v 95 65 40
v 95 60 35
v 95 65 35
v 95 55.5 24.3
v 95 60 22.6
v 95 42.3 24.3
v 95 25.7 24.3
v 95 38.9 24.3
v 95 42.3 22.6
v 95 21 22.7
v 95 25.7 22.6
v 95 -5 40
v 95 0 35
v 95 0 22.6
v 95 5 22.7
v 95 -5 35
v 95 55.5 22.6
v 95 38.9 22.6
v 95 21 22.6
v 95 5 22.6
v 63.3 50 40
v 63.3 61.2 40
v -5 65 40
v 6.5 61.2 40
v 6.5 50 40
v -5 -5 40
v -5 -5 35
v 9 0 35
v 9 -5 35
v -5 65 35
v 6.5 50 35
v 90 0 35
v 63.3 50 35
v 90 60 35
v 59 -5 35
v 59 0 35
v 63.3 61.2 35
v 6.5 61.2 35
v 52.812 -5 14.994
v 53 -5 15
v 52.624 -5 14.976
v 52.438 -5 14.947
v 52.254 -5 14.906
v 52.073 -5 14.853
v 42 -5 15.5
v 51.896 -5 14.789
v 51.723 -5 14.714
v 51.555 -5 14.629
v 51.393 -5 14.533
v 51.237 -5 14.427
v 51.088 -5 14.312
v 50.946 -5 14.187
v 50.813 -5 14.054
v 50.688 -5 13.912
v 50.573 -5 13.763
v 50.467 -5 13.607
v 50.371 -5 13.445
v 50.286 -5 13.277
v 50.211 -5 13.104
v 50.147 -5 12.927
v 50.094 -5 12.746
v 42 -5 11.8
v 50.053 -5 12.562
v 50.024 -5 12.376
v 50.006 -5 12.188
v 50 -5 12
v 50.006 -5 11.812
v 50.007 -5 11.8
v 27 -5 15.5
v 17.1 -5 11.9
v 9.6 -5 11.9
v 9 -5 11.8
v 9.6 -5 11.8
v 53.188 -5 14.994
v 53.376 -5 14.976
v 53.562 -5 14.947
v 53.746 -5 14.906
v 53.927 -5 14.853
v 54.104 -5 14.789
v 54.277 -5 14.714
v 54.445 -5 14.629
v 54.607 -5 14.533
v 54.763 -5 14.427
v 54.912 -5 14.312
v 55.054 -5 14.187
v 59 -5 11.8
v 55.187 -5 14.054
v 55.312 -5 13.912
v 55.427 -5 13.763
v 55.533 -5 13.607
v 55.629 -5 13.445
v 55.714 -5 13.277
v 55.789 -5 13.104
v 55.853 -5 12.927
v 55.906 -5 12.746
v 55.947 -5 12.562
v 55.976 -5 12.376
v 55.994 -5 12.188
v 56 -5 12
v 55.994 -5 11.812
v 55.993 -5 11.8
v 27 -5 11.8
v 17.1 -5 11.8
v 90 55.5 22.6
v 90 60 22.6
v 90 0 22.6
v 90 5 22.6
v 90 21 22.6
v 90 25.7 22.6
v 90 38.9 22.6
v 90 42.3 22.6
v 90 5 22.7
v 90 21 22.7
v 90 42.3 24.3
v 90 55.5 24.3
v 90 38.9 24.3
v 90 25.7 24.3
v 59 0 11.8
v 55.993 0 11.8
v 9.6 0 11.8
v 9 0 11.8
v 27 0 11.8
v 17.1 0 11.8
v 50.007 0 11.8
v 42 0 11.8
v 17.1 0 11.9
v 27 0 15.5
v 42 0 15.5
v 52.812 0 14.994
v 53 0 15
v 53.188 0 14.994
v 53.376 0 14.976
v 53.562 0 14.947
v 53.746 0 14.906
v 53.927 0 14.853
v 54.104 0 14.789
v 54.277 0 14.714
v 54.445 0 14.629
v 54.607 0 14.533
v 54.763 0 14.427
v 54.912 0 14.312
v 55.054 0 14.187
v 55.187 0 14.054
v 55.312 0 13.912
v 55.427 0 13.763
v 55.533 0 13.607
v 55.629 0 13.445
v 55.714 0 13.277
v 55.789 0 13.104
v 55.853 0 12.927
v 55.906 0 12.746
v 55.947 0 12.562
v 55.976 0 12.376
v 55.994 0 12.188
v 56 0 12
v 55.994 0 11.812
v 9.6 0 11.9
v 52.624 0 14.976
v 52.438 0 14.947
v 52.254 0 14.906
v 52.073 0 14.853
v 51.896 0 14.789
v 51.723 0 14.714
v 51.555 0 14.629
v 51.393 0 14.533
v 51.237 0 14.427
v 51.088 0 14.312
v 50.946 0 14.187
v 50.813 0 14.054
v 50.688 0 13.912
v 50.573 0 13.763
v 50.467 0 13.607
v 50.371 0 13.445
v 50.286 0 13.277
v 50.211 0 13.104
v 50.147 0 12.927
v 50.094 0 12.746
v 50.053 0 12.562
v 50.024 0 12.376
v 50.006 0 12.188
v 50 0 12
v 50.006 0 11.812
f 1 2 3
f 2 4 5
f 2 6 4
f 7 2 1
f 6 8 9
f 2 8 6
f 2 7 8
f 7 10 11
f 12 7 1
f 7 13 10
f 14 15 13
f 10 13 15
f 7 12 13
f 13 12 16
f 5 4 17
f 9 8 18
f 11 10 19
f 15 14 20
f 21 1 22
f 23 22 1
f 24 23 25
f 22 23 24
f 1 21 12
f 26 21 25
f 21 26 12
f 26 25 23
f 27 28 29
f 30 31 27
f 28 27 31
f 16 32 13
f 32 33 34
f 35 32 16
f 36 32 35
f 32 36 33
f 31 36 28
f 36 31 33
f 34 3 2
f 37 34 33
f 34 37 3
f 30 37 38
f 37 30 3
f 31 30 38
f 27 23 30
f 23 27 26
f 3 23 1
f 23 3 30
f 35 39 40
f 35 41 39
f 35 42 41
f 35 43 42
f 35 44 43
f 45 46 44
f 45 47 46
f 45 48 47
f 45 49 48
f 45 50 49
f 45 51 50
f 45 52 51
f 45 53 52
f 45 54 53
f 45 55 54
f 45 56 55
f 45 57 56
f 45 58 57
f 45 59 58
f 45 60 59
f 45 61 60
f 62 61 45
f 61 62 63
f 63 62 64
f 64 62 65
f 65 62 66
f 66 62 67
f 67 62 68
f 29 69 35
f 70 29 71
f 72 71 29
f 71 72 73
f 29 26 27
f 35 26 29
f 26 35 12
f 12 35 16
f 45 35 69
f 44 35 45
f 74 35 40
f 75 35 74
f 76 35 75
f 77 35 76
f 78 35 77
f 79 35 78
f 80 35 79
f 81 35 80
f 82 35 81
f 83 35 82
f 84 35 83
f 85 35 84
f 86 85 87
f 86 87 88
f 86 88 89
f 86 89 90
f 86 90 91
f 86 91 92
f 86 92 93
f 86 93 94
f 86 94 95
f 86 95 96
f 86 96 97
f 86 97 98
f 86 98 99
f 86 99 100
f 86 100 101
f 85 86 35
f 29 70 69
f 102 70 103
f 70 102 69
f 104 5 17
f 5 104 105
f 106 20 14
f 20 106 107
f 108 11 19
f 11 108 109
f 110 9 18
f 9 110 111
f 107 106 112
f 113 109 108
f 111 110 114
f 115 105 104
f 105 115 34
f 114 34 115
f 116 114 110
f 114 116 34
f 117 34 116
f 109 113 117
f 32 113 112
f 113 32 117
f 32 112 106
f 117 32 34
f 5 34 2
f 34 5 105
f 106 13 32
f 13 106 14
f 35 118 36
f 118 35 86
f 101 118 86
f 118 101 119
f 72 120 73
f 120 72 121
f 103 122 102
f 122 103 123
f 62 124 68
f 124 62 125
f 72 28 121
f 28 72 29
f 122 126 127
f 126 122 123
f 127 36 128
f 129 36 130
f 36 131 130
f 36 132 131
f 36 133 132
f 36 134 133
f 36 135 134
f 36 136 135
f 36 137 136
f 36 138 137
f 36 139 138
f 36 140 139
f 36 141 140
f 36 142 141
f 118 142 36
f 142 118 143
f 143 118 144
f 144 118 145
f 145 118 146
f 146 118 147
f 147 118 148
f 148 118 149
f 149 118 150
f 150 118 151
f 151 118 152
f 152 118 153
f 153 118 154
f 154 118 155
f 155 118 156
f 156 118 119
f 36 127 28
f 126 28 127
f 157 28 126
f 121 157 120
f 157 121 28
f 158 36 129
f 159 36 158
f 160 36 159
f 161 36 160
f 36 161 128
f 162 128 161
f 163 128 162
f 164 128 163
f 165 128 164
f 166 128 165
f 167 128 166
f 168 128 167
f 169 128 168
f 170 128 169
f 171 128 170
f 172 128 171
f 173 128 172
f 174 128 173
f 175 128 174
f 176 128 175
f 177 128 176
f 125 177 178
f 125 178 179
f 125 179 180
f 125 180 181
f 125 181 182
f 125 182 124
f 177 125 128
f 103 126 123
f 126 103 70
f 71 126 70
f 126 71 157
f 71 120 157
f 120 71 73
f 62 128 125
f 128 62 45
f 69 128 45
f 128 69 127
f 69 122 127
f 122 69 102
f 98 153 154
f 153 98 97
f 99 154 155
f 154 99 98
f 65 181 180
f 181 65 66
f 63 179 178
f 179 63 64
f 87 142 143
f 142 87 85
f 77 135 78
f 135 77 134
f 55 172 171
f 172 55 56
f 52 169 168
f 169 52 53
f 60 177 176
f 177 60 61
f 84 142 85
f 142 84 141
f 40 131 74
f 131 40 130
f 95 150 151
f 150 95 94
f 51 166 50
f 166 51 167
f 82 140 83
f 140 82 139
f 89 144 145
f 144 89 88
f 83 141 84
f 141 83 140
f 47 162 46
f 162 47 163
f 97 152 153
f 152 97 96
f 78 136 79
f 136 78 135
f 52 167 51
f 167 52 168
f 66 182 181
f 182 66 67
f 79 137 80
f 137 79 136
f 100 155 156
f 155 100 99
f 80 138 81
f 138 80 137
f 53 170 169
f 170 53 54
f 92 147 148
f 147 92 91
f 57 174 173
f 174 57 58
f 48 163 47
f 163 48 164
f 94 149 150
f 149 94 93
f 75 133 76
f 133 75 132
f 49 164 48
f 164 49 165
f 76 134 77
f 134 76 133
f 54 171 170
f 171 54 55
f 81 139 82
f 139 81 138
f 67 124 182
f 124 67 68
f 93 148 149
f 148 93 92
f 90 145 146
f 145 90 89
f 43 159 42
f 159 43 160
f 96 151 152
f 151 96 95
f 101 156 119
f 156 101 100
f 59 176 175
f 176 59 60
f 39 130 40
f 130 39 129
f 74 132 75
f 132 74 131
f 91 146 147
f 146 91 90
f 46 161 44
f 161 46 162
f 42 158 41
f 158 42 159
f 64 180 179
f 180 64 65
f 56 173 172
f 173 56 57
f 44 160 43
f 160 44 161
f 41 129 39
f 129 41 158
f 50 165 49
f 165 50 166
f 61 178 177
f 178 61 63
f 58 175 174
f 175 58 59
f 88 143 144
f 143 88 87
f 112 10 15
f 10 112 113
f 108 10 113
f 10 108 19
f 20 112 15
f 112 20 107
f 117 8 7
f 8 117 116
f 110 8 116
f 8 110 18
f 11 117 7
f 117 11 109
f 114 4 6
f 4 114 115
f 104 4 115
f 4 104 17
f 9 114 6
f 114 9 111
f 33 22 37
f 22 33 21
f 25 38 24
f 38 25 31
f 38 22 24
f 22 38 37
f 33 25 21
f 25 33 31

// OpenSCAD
module raspberrypi(){
translate([0,0,-1.3])
cube([85,56,1.3]);
translate([6.6,-11.7,0])
cube([7.5,15.9,2.9]);

translate([24,-11.7,0])
cube([15,21,6.5]);

translate([50,1,3])
rotate(a=[90,0,0])
cylinder(r=3,h=12.7,$fn=100);

translate([65,2,0])
cube([31.4,16,13.7]);

translate([70.1,22.7,0])
cube([27,13.2,15.3]);

translate([70.1,39.3,0])
cube([27,13.2,15.3]);

translate([3.5,47,0])
cube([56.8,11.2,48.5]);
}




module diban(i){
    difference(){
        cube([90,60,5]);
        translate([4+i,4+i,-0.5])
        cylinder(r=1,h=8,$fn=100);
        translate([61.5+i,4+i,-0.5])
        cylinder(r=1,h=8,$fn=100);
        translate([4+i,52.5+i,-0.5])
        cylinder(r=1,h=8,$fn=100);
        translate([61.5+i,52.5+i,-0.5])
        cylinder(r=1,h=8,$fn=100);
    }
    module genji(){
        translate([4+i,4+i,5])
        cylinder(r=3,h=3,$fn=100);
        translate([61.5+i,4+i,5])
        cylinder(r=3,h=3,$fn=100);
        translate([4+i,52.5+i,5])
        cylinder(r=3,h=3,$fn=100);
        translate([61.5+i,52.5+i,5])
        cylinder(r=3,h=3,$fn=100);
    }
    difference(){
        genji();
        
        translate([4+i,4+i,-0.5])
        cylinder(r=1,h=10,$fn=100);
        translate([61.5+i,4+i,-0.5])
        cylinder(r=1,h=10,$fn=100);
        translate([4+i,52.5+i,-0.5])
        cylinder(r=1,h=10,$fn=100);
        translate([61.5+i,52.5+i,-0.5])
        cylinder(r=1,h=10,$fn=100);
        }
}

module all(){
    diban(2);
    translate([0,-5,0])
    cube([90,5,35]);
    translate([0,60,0])
    cube([90,5,35]);
    translate([-5,-5,0])
    cube([5,70,35]);
    translate([90,-5,0])
    cube([5,70,35]);
}

module all2(){
    diban(2);
    translate([0,-5.5,0])
    cube([90,6,35]);
    translate([0,59.5,0])
    cube([90,6,35]);
    translate([-5.5,-5,0])
    cube([6,70,35]);
    translate([89.5,-5,0])
    cube([6,70,35]);
}

module xia(){
    difference(){ 
    all();
    translate([3,3,9])
    raspberrypi();
    translate([89,0,22.6])
    cube([7,60,20]);
    translate([9,-6,11.8])
    cube([50,7,30]);
}}


module xia2(){
    difference(){ 
    all();
    translate([3,3,9])
    raspberrypi();
    translate([89,0,22.6])
    cube([7,60,20]);
    translate([9,-6,11.8])
    cube([50,7,30]);
}}
module shang1(){
translate([-5,-5,35])
cube([100,70,5]);


translate([90,0,22.6])
    cube([5,60,12.4]);


    translate([9,-5,11.8])
    cube([50,5,23.2]);
}

difference(){
    shang1();
    translate([3,3,9])
    raspberrypi();
    
}
//xia();
